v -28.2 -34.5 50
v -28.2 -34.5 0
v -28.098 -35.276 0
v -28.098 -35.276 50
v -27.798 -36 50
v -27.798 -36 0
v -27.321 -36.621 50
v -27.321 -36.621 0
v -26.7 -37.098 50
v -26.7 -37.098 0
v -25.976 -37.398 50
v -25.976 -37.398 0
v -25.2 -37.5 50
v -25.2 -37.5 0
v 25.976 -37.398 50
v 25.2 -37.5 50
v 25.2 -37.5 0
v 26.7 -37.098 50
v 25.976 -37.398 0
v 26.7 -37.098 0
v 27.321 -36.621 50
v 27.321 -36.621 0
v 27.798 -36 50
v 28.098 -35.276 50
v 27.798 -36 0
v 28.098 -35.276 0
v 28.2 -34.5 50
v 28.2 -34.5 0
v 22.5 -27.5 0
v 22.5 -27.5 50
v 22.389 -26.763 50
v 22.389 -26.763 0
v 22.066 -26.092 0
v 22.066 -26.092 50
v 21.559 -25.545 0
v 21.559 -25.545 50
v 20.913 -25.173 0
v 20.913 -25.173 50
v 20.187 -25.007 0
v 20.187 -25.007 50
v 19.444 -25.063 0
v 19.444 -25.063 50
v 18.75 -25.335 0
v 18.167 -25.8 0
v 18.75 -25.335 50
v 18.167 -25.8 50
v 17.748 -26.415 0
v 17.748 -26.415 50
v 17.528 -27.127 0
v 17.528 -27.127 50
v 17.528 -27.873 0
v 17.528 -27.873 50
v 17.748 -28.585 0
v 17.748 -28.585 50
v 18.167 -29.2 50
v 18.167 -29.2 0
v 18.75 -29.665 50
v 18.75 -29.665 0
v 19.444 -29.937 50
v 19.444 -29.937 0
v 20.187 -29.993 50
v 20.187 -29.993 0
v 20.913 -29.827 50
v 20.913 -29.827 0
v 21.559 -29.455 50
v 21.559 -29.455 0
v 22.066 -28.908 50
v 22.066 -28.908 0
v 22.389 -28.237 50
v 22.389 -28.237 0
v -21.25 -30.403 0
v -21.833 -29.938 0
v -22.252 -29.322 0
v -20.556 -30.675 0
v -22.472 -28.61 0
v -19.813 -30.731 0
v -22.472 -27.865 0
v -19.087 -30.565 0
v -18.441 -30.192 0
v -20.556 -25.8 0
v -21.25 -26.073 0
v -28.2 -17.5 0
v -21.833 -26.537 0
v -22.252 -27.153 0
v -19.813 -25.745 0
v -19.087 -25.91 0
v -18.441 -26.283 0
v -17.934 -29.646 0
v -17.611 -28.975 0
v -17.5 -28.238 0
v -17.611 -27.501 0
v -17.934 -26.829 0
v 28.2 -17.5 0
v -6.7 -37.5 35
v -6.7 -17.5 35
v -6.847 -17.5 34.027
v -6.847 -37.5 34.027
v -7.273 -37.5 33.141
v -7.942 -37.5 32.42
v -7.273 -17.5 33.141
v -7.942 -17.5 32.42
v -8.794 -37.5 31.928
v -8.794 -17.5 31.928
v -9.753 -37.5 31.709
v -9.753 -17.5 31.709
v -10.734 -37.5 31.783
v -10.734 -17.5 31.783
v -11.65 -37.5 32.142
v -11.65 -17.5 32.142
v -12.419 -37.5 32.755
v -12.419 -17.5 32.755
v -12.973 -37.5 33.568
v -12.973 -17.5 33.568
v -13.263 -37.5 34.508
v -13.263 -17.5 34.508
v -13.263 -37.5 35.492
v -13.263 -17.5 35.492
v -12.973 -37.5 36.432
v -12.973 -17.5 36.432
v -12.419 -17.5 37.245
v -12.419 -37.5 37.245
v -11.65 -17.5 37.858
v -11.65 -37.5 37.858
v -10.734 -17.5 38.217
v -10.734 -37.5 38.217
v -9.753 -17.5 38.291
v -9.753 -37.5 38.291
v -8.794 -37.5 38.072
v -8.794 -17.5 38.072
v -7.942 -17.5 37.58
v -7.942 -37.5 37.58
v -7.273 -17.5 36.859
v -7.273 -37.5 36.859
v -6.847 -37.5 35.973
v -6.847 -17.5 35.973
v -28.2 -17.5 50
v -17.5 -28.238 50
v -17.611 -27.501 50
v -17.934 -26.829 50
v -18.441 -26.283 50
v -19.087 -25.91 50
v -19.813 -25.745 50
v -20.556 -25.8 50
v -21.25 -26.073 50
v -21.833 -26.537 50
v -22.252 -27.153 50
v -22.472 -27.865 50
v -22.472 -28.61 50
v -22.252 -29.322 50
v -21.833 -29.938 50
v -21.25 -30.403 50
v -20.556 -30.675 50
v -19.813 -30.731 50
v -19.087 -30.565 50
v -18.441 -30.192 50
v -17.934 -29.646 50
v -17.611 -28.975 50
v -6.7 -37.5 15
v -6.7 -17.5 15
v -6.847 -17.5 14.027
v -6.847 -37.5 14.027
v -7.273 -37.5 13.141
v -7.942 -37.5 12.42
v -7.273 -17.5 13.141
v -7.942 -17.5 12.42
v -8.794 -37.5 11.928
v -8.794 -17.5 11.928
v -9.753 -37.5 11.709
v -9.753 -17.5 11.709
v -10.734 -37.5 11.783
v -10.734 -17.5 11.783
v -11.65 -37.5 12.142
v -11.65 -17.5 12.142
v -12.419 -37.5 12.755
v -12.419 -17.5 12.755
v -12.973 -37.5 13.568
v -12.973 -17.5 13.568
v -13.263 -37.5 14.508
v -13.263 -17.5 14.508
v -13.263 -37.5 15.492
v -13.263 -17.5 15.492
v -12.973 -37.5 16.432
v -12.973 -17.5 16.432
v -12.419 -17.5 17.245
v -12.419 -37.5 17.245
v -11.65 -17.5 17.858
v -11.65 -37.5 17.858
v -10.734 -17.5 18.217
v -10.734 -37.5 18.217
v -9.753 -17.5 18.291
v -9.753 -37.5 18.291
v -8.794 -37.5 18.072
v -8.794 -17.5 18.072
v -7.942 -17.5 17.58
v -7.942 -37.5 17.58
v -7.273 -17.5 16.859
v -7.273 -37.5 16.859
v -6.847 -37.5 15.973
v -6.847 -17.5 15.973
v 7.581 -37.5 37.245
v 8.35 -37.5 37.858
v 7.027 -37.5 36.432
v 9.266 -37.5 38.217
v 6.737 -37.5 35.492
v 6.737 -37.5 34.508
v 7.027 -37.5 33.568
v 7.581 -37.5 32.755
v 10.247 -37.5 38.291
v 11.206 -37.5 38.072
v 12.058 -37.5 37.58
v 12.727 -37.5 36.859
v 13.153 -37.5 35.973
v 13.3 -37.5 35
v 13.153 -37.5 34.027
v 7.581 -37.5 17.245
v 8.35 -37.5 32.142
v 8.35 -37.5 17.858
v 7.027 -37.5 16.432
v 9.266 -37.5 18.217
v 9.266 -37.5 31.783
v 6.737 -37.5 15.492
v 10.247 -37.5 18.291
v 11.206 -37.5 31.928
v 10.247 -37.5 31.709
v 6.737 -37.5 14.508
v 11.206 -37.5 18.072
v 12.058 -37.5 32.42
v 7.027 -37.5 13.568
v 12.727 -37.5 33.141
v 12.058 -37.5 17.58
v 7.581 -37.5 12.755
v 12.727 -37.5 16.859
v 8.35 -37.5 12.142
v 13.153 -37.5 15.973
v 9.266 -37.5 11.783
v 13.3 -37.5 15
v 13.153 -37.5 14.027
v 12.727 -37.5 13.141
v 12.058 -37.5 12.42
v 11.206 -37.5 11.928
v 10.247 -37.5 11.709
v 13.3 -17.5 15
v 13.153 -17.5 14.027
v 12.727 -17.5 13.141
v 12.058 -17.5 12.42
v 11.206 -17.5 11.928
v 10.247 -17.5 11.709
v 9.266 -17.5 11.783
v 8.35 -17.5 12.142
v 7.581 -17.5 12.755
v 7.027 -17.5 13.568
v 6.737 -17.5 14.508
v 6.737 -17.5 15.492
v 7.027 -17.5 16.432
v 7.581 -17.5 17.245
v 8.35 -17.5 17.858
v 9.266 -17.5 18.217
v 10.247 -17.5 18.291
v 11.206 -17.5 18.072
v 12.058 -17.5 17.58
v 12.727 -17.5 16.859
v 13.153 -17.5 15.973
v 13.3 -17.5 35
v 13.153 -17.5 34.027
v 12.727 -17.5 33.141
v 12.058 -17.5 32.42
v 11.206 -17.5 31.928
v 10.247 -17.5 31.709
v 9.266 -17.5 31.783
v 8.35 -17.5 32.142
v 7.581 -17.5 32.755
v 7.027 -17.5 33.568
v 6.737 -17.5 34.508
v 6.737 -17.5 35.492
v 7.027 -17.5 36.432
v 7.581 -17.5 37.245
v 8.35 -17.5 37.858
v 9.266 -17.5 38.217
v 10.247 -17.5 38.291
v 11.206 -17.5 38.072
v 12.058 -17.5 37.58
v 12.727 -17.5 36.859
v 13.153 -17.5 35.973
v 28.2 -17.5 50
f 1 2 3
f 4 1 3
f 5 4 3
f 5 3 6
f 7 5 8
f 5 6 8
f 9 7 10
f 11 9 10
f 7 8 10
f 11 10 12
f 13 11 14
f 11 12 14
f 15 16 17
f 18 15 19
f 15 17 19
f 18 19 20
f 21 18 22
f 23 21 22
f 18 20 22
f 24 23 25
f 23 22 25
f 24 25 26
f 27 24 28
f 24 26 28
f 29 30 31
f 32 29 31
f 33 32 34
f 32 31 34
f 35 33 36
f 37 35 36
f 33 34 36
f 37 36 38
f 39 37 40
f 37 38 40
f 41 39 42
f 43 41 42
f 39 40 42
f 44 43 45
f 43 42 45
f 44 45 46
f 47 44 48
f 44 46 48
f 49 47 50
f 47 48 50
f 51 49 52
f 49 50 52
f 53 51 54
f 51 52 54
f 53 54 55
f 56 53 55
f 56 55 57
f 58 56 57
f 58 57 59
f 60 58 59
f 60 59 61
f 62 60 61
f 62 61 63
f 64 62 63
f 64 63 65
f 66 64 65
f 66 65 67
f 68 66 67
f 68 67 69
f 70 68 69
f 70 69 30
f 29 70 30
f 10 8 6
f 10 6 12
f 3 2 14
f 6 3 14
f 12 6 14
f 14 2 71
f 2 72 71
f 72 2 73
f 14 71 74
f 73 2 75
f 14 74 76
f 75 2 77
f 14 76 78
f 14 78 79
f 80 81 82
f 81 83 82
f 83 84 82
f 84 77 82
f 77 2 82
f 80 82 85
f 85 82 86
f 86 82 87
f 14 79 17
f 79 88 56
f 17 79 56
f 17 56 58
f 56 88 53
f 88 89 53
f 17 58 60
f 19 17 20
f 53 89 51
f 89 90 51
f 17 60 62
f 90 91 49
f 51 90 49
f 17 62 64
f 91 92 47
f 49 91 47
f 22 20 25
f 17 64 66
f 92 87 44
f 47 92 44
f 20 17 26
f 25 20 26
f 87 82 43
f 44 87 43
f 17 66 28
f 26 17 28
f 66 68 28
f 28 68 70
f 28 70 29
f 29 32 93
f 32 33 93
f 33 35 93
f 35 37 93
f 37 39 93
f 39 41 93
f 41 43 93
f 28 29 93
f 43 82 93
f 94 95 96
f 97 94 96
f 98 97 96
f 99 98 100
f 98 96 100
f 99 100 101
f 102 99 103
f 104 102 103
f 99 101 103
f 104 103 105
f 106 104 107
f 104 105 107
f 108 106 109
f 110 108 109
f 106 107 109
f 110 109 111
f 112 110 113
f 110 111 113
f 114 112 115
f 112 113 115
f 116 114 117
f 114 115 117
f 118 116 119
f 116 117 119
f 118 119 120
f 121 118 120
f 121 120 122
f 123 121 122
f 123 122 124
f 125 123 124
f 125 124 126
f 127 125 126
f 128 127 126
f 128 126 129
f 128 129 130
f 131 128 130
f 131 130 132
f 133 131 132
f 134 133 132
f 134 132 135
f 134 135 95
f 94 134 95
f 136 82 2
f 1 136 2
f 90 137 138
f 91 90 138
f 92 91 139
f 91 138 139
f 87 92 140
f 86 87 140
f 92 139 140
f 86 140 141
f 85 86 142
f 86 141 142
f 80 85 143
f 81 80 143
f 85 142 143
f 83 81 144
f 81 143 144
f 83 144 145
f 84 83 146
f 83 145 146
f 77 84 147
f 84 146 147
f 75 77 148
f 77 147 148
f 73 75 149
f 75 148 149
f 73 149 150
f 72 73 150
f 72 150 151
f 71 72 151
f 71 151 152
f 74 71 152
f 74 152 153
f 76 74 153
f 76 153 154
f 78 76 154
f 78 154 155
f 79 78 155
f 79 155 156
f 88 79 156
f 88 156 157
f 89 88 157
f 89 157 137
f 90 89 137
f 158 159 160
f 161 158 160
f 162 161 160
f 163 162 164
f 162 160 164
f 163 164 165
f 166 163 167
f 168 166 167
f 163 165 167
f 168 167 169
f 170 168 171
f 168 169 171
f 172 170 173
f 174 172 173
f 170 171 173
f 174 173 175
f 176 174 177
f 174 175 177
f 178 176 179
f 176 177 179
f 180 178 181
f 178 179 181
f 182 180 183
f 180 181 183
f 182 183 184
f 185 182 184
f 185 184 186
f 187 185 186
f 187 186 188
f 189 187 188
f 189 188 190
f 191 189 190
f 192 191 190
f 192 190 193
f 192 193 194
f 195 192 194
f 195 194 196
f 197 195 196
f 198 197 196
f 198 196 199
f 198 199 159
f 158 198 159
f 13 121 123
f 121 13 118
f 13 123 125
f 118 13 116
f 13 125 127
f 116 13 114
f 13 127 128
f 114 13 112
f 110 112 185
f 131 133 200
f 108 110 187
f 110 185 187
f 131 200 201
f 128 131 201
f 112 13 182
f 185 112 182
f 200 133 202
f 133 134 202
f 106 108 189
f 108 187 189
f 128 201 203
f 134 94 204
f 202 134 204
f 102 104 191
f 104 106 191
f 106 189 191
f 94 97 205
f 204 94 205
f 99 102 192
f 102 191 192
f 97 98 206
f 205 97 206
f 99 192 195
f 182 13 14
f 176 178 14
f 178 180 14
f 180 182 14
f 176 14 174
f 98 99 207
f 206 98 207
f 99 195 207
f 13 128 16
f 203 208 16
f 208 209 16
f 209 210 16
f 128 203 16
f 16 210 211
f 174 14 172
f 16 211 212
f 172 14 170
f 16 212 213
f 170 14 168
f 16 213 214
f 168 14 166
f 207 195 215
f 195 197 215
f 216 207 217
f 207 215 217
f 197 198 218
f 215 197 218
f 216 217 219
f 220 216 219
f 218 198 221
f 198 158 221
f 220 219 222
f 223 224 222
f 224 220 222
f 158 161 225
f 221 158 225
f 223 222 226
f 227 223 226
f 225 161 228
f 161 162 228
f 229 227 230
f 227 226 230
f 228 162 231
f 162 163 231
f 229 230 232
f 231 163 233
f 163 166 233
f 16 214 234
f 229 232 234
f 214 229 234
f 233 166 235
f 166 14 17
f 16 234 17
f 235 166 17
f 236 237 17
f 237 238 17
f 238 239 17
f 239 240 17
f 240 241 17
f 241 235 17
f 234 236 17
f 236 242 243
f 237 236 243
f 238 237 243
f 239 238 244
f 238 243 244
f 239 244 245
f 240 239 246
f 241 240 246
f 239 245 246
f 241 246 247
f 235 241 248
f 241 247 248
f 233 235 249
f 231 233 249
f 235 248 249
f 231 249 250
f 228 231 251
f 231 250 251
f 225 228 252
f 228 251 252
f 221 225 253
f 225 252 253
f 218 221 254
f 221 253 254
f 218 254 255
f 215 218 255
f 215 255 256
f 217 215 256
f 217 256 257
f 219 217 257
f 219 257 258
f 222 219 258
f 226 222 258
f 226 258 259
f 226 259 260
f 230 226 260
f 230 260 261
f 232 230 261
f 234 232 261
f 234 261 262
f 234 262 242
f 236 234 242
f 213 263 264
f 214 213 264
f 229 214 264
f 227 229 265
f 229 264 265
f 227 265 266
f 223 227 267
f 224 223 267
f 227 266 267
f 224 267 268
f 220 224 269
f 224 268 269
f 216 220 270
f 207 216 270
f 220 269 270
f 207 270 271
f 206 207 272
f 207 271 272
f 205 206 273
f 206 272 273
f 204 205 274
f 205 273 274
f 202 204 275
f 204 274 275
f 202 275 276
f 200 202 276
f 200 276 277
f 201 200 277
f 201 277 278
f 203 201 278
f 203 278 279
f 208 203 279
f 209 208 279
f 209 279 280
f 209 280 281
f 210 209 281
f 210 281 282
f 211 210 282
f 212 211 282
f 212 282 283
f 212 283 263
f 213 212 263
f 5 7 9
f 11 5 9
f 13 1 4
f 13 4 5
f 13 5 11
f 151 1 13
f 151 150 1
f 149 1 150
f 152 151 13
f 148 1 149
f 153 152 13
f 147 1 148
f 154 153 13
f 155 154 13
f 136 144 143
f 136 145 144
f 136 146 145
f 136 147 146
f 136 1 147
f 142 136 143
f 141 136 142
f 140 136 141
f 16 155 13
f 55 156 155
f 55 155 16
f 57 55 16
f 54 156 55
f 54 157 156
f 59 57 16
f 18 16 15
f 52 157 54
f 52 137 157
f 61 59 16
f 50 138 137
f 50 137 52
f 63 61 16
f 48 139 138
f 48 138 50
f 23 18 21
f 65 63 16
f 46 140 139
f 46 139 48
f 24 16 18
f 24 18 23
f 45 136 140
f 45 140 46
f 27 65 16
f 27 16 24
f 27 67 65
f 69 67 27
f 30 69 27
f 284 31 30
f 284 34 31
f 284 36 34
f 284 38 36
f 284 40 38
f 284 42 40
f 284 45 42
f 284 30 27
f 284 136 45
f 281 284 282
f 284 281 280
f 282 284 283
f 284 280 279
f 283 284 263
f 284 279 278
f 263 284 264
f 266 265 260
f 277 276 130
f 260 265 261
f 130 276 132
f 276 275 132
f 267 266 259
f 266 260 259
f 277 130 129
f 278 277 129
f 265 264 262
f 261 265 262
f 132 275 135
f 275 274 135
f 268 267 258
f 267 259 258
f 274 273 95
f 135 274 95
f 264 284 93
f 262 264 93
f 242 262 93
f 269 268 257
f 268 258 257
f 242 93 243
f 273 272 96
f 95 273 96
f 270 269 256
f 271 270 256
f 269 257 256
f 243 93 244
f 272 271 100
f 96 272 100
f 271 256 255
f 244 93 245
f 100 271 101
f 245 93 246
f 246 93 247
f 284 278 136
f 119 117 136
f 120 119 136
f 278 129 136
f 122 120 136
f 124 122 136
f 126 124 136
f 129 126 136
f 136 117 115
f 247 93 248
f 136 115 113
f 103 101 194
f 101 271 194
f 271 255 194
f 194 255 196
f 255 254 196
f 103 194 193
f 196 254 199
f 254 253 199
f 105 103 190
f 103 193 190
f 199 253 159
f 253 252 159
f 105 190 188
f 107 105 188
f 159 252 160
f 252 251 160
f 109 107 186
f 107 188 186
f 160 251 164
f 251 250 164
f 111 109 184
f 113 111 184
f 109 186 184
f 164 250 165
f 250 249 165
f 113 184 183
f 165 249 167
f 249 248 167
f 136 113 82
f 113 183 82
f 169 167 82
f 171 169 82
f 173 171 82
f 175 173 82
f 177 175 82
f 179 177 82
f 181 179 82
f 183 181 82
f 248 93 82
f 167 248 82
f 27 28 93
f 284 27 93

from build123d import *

# Parameters (mm, degrees)
BOSS_EXTRUDE1_DEPTH     = 50
TAP_DRILL_FOR_M6_TAP1_D = 5
M6_CLEARANCE_HOLE1_D    = 6.6


with BuildPart() as part:
    # Sketch1 → Boss-Extrude1 (new body)
    with BuildSketch(Plane.XY):
        with BuildLine():
            Line((28.2, -17.5), (-28.2, -17.5))
            Line((-28.2, -17.5), (-28.2, -34.5))
            ThreePointArc((-28.2, -34.5), (-27.321320344, -36.621320344), (-25.2, -37.5))
            Line((-25.2, -37.5), (25.2, -37.5))
            ThreePointArc((25.2, -37.5), (27.321320343, -36.621320344), (28.2, -34.5))
            Line((28.2, -34.5), (28.2, -17.5))
        make_face()
    extrude(amount=BOSS_EXTRUDE1_DEPTH)

    # Tap Drill for M6 Tap1 (through all)
    with Locations(Plane(origin=(0, 0, 0), x_dir=(-1, 0, 0), z_dir=(0, 0, -1))):
        with Locations((-20, -27.5), (20, -28.237657735)):
            Hole(TAP_DRILL_FOR_M6_TAP1_D / 2)

    # M6 Clearance Hole1 (through all)
    with Locations(Plane(origin=(0, -37.5, 0), x_dir=(-1, 0, 0), z_dir=(0, -1, 0))):
        with Locations((10, -15), (-10, -35), (10, -35), (-10, -15)):
            Hole(M6_CLEARANCE_HOLE1_D / 2)


solid = part.part
